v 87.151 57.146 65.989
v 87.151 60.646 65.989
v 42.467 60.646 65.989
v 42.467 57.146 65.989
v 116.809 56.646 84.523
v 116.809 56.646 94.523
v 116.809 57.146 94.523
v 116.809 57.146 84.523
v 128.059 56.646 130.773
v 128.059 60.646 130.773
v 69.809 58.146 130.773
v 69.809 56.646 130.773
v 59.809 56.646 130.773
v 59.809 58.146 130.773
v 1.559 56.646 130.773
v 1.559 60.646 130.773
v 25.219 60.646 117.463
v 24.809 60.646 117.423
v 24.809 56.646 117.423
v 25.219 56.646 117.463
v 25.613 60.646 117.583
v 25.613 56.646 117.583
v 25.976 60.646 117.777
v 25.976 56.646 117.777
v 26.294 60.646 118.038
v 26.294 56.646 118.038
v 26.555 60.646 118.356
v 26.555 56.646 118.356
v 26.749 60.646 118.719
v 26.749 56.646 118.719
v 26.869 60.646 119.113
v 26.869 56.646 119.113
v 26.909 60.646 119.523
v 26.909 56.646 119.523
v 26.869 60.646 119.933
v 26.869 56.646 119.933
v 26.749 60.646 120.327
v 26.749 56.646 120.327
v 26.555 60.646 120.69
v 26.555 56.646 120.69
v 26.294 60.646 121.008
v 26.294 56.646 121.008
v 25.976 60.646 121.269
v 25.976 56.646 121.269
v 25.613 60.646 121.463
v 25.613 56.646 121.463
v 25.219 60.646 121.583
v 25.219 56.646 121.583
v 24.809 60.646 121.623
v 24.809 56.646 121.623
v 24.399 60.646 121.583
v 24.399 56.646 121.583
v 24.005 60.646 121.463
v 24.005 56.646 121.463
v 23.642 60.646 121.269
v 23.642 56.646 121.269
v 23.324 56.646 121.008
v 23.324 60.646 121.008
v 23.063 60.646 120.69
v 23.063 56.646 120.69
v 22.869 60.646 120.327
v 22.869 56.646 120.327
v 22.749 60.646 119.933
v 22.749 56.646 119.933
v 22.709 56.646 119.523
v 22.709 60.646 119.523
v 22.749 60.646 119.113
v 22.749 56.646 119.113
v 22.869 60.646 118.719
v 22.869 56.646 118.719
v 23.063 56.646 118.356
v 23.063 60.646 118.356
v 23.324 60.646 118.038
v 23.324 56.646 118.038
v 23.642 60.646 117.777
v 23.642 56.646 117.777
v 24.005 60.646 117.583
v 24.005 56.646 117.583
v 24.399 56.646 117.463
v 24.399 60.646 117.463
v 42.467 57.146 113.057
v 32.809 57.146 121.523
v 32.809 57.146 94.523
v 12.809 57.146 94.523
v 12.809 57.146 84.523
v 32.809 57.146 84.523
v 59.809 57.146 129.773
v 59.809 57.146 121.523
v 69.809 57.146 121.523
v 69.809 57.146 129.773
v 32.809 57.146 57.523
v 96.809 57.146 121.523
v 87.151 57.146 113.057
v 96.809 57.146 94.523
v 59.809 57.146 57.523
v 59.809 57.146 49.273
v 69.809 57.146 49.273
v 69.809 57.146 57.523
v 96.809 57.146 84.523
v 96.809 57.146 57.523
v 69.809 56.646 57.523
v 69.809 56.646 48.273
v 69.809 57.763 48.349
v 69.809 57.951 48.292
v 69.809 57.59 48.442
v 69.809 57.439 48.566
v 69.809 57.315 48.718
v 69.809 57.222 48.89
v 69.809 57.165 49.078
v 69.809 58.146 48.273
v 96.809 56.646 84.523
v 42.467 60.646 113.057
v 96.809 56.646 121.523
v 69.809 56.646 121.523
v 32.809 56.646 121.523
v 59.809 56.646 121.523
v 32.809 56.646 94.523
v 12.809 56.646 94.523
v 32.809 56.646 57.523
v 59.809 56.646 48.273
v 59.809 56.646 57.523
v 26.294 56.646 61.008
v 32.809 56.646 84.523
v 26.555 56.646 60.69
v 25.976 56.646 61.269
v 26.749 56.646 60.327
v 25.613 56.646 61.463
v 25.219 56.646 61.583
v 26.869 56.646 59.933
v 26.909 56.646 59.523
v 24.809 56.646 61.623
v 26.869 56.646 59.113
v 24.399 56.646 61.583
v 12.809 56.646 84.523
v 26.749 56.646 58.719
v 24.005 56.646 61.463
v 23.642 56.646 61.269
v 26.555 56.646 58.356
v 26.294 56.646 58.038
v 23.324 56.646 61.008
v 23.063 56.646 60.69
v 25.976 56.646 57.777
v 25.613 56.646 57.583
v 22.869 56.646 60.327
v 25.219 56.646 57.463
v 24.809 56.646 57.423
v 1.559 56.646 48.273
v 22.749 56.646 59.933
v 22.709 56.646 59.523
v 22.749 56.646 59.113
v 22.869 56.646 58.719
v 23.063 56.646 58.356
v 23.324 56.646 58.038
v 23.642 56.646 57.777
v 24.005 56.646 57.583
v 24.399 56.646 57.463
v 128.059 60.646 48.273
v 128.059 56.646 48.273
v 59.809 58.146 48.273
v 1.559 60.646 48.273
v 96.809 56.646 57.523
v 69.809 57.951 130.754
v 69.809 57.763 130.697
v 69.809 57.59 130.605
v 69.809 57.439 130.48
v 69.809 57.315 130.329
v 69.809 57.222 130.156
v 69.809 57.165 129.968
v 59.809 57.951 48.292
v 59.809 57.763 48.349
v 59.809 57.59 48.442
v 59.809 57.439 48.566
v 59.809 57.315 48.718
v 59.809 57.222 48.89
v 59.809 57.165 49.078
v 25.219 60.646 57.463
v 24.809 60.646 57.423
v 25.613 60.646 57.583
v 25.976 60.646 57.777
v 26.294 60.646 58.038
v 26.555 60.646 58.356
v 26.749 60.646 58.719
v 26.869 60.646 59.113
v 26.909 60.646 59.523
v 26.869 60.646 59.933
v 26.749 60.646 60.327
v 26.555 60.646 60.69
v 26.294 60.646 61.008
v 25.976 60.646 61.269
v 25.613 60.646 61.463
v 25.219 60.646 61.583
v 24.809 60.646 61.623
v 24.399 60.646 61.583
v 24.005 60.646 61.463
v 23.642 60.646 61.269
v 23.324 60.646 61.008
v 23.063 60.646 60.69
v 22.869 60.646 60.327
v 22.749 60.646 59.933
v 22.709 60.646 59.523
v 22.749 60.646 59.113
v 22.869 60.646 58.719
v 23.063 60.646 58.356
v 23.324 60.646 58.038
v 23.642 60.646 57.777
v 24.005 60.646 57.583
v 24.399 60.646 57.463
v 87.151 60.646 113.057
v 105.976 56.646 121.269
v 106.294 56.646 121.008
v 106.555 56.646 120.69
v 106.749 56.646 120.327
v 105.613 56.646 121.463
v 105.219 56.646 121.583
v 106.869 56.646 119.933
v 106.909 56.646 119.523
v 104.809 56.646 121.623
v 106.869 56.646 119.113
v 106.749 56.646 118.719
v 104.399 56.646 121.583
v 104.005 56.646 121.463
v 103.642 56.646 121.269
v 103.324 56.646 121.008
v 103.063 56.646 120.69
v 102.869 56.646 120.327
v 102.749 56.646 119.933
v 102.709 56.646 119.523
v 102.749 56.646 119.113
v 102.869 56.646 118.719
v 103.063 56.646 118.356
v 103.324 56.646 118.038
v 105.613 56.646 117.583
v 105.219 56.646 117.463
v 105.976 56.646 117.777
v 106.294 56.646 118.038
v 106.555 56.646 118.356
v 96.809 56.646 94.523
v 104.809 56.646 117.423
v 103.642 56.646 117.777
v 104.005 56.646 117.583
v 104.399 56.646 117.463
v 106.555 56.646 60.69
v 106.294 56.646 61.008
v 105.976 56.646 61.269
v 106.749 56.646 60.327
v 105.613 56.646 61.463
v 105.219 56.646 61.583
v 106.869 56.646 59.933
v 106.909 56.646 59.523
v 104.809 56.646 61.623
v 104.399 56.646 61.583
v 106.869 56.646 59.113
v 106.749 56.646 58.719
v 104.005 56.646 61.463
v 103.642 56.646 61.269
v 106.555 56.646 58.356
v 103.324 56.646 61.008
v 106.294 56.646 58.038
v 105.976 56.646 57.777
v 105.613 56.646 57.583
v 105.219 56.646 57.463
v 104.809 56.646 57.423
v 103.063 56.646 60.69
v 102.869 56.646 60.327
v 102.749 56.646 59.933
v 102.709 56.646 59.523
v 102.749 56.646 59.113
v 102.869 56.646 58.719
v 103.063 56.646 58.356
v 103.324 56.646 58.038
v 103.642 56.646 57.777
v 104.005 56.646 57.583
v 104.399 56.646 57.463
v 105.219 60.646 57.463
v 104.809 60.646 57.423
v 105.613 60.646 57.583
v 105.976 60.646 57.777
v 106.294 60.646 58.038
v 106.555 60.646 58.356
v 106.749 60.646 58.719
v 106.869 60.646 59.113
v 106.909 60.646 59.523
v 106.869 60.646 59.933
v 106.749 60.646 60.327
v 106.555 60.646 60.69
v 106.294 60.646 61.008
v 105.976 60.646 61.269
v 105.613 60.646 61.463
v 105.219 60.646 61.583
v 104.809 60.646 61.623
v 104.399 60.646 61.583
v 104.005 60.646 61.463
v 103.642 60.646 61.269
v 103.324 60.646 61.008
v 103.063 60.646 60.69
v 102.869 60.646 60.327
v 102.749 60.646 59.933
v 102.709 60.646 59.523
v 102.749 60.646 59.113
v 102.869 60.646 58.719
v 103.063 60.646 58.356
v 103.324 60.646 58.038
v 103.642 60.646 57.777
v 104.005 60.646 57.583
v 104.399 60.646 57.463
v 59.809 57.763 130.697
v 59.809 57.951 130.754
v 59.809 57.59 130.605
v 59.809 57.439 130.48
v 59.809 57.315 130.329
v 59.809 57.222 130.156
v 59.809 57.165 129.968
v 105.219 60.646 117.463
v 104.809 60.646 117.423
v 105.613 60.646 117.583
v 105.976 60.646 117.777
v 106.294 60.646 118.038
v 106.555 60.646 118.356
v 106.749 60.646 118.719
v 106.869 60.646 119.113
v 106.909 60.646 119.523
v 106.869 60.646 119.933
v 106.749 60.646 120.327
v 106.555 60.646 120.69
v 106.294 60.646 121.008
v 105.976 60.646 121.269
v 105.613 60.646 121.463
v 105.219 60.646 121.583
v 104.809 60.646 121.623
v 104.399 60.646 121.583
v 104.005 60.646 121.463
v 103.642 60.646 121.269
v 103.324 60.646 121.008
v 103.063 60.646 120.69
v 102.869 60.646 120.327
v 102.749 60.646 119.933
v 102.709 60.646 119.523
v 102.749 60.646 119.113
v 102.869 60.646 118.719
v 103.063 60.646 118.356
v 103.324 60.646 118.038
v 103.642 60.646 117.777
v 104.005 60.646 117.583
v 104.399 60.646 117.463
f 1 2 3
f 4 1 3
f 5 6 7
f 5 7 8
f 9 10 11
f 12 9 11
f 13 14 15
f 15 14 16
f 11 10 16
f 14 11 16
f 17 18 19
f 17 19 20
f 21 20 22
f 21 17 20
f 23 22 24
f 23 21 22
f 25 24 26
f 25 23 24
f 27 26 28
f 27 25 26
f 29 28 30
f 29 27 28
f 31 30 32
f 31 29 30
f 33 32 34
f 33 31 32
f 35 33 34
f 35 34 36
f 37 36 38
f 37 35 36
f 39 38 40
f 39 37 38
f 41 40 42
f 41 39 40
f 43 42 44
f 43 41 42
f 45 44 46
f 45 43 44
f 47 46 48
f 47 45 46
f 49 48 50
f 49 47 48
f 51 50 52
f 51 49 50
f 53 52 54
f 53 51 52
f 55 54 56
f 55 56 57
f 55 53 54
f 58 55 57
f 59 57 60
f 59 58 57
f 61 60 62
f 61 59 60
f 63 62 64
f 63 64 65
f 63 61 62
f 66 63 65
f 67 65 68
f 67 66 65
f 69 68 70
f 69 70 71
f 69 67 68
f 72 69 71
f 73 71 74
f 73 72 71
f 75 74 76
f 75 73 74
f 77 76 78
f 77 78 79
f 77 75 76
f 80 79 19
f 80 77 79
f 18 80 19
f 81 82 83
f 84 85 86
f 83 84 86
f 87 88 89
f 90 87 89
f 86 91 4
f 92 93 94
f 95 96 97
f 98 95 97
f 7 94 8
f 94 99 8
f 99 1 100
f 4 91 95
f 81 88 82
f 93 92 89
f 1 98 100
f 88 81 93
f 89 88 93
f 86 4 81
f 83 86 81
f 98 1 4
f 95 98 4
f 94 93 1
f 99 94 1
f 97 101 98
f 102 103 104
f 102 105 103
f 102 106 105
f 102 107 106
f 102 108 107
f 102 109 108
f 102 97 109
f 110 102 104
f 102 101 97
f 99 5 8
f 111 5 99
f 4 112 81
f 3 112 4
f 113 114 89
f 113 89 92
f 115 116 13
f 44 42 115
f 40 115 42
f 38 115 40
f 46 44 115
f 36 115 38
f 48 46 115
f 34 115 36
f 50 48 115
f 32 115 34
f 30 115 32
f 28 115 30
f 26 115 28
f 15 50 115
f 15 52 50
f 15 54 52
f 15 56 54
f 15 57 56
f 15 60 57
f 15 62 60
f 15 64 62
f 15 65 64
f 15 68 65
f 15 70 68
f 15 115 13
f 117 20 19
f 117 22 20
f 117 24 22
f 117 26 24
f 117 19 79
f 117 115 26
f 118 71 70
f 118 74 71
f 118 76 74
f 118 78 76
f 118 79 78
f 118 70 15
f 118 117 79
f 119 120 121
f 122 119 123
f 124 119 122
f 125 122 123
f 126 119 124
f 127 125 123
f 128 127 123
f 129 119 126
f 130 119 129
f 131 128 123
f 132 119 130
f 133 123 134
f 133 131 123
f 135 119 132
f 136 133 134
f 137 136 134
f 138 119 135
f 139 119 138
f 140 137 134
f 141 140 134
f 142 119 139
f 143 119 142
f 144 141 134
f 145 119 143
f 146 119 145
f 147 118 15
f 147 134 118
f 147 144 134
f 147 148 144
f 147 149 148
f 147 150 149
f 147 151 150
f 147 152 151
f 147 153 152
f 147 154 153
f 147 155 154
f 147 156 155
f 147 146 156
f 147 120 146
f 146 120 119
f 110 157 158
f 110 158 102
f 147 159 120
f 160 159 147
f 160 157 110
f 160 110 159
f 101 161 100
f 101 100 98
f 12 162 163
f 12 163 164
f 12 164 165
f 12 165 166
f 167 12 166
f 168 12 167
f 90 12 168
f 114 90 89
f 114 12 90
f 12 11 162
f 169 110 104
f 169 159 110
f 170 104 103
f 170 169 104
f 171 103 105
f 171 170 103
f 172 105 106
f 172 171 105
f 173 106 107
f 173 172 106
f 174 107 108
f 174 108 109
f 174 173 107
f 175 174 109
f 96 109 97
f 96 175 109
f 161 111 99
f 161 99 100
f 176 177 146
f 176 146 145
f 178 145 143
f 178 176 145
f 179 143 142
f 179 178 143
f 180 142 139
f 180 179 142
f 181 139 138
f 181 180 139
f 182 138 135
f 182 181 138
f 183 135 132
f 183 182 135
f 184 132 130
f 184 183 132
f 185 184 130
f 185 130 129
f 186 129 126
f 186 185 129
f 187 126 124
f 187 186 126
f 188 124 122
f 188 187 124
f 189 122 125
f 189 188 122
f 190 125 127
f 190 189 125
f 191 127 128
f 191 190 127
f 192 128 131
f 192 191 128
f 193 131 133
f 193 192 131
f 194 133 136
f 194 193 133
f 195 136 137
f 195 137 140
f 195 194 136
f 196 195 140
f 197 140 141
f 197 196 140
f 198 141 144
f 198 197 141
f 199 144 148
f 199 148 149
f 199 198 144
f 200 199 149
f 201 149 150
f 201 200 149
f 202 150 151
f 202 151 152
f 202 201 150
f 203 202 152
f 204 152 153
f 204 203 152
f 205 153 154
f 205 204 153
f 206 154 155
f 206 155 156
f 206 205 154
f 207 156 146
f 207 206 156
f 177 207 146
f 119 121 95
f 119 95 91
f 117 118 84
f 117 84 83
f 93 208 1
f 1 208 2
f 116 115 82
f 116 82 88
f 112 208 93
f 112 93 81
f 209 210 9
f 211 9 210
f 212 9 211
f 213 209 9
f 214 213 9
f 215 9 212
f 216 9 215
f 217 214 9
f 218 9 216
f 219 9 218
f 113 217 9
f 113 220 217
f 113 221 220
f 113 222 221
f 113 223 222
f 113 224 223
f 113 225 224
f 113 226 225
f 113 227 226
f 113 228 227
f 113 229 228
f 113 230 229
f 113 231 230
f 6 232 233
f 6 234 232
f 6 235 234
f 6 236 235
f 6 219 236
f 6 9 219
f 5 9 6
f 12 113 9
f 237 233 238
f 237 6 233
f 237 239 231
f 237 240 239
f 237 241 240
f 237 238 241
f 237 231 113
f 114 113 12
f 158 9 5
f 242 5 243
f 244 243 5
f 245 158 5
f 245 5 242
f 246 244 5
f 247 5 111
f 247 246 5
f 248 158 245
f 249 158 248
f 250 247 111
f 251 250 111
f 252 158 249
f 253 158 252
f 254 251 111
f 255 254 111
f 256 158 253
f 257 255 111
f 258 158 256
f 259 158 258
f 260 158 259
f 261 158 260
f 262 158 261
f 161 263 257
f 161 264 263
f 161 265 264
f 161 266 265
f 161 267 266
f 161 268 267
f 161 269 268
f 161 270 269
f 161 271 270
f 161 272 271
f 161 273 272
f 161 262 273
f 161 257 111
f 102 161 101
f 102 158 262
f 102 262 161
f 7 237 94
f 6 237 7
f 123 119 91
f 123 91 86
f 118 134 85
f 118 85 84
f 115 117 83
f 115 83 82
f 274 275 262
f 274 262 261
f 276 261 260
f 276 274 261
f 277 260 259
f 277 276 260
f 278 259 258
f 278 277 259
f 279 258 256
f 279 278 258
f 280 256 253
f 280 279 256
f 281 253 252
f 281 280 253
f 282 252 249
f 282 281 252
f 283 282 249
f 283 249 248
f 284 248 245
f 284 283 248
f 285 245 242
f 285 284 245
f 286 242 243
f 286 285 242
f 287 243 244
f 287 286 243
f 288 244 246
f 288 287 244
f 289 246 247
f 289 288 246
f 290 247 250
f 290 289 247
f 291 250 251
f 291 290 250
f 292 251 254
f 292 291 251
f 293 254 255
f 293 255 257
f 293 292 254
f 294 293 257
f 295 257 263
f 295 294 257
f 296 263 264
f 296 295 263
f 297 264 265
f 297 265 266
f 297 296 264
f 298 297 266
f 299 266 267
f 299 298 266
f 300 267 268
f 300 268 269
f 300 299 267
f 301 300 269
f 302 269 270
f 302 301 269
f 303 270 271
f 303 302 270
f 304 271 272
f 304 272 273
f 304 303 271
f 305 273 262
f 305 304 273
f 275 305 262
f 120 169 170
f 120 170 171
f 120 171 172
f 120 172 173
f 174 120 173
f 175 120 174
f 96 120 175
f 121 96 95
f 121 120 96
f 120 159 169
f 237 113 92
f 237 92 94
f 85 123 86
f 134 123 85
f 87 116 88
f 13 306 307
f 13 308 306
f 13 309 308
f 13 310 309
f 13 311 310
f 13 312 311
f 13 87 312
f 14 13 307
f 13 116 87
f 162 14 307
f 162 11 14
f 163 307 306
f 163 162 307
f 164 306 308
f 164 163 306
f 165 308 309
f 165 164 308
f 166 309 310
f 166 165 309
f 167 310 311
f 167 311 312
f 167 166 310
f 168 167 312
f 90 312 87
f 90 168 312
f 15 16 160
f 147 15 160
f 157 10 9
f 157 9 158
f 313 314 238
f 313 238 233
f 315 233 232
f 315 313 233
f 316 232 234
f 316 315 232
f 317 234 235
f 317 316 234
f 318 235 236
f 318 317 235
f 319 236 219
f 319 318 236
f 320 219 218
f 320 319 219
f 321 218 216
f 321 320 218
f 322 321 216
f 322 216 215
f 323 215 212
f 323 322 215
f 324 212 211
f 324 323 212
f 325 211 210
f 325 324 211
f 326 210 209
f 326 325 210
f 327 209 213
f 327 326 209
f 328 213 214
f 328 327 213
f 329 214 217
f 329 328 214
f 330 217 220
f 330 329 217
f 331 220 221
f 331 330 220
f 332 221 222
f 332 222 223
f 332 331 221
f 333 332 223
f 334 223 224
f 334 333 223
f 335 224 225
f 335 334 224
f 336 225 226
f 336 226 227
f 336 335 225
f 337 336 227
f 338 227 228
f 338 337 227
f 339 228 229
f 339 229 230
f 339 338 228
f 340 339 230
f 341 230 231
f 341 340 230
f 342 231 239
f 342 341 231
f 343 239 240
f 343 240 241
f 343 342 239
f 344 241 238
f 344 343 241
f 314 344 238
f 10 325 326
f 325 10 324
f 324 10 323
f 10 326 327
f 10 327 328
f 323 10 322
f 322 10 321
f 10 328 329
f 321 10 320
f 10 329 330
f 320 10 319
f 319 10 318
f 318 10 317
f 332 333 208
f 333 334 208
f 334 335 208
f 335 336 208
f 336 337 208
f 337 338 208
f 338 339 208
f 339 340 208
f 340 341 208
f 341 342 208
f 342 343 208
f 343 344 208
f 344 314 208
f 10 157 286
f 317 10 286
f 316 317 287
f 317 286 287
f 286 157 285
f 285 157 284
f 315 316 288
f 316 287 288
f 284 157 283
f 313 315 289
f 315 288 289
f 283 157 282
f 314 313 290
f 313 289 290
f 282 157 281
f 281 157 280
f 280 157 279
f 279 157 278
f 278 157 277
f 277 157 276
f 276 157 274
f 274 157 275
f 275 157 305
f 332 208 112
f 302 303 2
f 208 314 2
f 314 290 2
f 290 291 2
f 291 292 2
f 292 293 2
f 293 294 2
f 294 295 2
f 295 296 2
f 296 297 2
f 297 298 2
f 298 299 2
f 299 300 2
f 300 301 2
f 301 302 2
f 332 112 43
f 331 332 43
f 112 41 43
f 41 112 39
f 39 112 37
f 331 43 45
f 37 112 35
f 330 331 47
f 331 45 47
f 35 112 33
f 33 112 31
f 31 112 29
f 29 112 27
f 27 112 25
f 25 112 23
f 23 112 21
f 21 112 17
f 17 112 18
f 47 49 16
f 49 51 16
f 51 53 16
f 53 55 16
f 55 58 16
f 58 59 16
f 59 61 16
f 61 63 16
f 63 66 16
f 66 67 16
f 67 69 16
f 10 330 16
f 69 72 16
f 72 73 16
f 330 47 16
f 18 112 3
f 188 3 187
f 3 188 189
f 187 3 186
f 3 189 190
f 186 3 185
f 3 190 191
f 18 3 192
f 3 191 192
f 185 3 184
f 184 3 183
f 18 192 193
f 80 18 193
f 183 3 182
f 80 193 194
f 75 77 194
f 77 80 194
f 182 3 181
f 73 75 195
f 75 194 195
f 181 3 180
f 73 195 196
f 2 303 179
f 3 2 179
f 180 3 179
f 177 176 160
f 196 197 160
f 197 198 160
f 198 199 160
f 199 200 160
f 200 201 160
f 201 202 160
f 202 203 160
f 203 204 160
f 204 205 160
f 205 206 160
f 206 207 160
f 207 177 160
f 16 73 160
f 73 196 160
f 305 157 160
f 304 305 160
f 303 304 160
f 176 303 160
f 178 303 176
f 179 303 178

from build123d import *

# Parameters (mm, degrees)
SKETCH_1_W          = 126.5
SKETCH_1_H          = 82.5
SKETCH_1_R          = 2.1
SKETCH_1_W_2        = 44.684550296
SKETCH_1_H_2        = 47.068057481
EXTRUDE_1_DEPTH     = 4
CUT_EXTRUDE_1_DEPTH = 0.5
FILLET_1_R          = 1


with BuildPart() as part:
    # Эскиз1 → Бобышка-Вытянуть1 (new body)
    with BuildSketch(Plane(origin=(0, 60.645974268, 0), x_dir=(-1, 0, 0), z_dir=(0, -1, 0))):
        with Locations((-64.808980694, -89.523129836)):
            Rectangle(SKETCH_1_W, SKETCH_1_H)
        with Locations(Location((-24.808980694, -59.523129836, 0), (0, 0, 90))):
            Circle(SKETCH_1_R, mode=Mode.SUBTRACT)
        with Locations(Location((-104.808980694, -59.523129836, 0), (0, 0, 90))):
            Circle(SKETCH_1_R, mode=Mode.SUBTRACT)
        with Locations(Location((-24.808980694, -119.523129836, 0), (0, 0, 90))):
            Circle(SKETCH_1_R, mode=Mode.SUBTRACT)
        with Locations(Location((-104.808980694, -119.523129836, 0), (0, 0, 90))):
            Circle(SKETCH_1_R, mode=Mode.SUBTRACT)
        with Locations((-64.808980694, -89.523129837)):
            Rectangle(SKETCH_1_W_2, SKETCH_1_H_2, mode=Mode.SUBTRACT)
    extrude(amount=EXTRUDE_1_DEPTH)

    # Эскиз3 → Вырез-Вытянуть1 (cut)
    with BuildSketch(Plane(origin=(0, 56.645974268, 0), x_dir=(-1, 0, 0), z_dir=(0, -1, 0))):
        Polygon((-59.808980694, -57.523129836), (-32.808980694, -57.523129836), (-32.808980694, -84.523129836), (-12.808980694, -84.523129836), (-12.808980694, -94.523129836), (-32.808980694, -94.523129836), (-32.808980694, -121.523129836), (-59.808980694, -121.523129836), (-59.808980694, -130.773129836), (-69.808980694, -130.773129836), (-69.808980694, -121.523129836), (-96.808980694, -121.523129836), (-96.808980694, -94.523129836), (-116.808980694, -94.523129836), (-116.808980694, -84.523129836), (-96.808980694, -84.523129836), (-96.808980694, -57.523129836), (-69.808980694, -57.523129836), (-69.808980694, -48.273129836), (-59.808980694, -48.273129836), align=None)
    extrude(amount=-CUT_EXTRUDE_1_DEPTH, mode=Mode.SUBTRACT)

    # Скругление1
    fillet_1_edges = [part.edges().sort_by_distance(p)[0] for p in [
        (64.808980694, 57.145974268, 130.773129836),
        (64.808980694, 57.145974268, 48.273129836),
    ]]
    fillet(fillet_1_edges, radius=FILLET_1_R)


solid = part.part
